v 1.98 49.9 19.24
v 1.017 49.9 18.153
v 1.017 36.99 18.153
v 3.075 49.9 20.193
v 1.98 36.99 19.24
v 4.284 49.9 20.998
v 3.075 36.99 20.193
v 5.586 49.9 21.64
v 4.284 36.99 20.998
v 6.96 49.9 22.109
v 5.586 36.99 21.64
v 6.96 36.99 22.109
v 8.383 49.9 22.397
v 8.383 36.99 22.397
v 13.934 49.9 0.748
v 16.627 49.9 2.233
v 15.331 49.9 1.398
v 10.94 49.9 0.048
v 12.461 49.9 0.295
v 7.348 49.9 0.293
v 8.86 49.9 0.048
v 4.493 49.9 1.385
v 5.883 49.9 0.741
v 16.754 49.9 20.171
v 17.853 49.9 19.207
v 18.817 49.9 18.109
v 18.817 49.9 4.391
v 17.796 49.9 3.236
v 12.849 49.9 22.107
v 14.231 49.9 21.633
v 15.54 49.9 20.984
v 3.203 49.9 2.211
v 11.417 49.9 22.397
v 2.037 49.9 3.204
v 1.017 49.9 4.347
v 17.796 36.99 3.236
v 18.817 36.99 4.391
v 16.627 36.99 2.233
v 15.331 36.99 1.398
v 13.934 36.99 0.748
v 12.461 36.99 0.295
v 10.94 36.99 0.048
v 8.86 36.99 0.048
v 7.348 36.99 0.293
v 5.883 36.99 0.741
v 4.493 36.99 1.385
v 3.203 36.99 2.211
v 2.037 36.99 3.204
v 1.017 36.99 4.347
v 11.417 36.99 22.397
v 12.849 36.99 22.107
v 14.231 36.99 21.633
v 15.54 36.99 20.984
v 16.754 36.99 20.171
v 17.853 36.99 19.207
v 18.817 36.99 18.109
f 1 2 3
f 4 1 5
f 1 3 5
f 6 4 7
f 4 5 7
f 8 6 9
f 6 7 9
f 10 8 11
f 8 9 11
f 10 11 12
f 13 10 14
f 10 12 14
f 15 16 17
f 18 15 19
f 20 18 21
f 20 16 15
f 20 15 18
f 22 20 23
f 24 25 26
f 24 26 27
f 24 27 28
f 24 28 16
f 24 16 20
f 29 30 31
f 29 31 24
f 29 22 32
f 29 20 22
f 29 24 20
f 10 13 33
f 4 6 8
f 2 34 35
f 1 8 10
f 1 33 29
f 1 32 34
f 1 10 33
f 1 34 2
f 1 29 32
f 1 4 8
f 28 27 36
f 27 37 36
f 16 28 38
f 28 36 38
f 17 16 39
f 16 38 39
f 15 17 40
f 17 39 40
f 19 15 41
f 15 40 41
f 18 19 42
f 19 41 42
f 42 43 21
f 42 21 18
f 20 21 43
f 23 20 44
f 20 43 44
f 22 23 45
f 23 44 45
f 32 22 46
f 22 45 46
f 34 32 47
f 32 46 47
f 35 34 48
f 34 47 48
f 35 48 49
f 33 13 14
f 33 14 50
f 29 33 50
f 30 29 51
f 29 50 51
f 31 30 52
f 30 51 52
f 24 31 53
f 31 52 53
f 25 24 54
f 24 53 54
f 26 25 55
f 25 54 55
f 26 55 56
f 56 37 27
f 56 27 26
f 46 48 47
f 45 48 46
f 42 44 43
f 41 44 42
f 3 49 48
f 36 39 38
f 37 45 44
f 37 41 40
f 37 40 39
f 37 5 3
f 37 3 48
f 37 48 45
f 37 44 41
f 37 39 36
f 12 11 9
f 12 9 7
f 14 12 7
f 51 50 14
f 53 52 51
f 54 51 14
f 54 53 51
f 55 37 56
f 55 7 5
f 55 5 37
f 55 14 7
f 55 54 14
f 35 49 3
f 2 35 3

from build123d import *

# Parameters (mm, degrees)
CIRCLE_AS_DRAWN_R                       = 11.25
EXTRUDE002_DEPTH                        = 13
EXTRUDE002_ONTO_CIRCLE_ROLL_ANGLE       = 90
EXTRUDE002_ONTO_CIRCLE_PLACEMENT_ANGLE  = 180
RECTANGLE004_AS_DRAWN_W                 = 17.799999
RECTANGLE004_AS_DRAWN_H                 = 22.34914
EXTRUDE008_DEPTH                        = 13
EXTRUDE008_ONTO_RECTANGLE004_ROLL_ANGLE = 90


with BuildPart() as caixamotor:
    # Circle as drawn → Extrude002 (new)
    with BuildSketch(Plane.XY):
        Circle(CIRCLE_AS_DRAWN_R)
    extrude(amount=EXTRUDE002_DEPTH)


with BuildPart() as caixamotor_1:
    # Extrude002 onto Circle roll: moved
    add(caixamotor.part.rotate(Axis((0, 0, 0), (1, 0, 0)), EXTRUDE002_ONTO_CIRCLE_ROLL_ANGLE))


with BuildPart() as caixamotor_2:
    # Extrude002 onto Circle placement: moved
    add(caixamotor_1.part.moved(Location((9.4, 37, 11.25))).rotate(Axis((9.4, 37, 11.25), (0, 0, 1)), EXTRUDE002_ONTO_CIRCLE_PLACEMENT_ANGLE))


with BuildPart() as booleancaixamotor:
    # Rectangle004 as drawn → Extrude008 (new)
    with BuildSketch(Plane.XY):
        with Locations((8.899999, -11.17457)):
            Rectangle(RECTANGLE004_AS_DRAWN_W, RECTANGLE004_AS_DRAWN_H)
    extrude(amount=-EXTRUDE008_DEPTH)


with BuildPart() as booleancaixamotor_1:
    # Extrude008 onto Rectangle004 roll: moved
    add(booleancaixamotor.part.rotate(Axis((0, 0, 0), (1, 0, 0)), EXTRUDE008_ONTO_RECTANGLE004_ROLL_ANGLE))


with BuildPart() as booleancaixamotor_2:
    # Extrude008 onto Rectangle004 placement: moved
    add(booleancaixamotor_1.part.moved(Location((0.516884, 1.09014, 22.397291))))


with BuildPart() as booleancaixamotor_3:
    # Extrude008 placement: moved
    add(booleancaixamotor_2.part.moved(Location((0, 36, 0))))

    # Common: intersect CaixaMotor
    add(caixamotor_2.part, mode=Mode.INTERSECT)


with BuildPart() as booleancaixamotor_4:
    # Common placement: moved
    add(booleancaixamotor_3.part.moved(Location((0.5, -0.1, 0))))


solid = booleancaixamotor_4.part
